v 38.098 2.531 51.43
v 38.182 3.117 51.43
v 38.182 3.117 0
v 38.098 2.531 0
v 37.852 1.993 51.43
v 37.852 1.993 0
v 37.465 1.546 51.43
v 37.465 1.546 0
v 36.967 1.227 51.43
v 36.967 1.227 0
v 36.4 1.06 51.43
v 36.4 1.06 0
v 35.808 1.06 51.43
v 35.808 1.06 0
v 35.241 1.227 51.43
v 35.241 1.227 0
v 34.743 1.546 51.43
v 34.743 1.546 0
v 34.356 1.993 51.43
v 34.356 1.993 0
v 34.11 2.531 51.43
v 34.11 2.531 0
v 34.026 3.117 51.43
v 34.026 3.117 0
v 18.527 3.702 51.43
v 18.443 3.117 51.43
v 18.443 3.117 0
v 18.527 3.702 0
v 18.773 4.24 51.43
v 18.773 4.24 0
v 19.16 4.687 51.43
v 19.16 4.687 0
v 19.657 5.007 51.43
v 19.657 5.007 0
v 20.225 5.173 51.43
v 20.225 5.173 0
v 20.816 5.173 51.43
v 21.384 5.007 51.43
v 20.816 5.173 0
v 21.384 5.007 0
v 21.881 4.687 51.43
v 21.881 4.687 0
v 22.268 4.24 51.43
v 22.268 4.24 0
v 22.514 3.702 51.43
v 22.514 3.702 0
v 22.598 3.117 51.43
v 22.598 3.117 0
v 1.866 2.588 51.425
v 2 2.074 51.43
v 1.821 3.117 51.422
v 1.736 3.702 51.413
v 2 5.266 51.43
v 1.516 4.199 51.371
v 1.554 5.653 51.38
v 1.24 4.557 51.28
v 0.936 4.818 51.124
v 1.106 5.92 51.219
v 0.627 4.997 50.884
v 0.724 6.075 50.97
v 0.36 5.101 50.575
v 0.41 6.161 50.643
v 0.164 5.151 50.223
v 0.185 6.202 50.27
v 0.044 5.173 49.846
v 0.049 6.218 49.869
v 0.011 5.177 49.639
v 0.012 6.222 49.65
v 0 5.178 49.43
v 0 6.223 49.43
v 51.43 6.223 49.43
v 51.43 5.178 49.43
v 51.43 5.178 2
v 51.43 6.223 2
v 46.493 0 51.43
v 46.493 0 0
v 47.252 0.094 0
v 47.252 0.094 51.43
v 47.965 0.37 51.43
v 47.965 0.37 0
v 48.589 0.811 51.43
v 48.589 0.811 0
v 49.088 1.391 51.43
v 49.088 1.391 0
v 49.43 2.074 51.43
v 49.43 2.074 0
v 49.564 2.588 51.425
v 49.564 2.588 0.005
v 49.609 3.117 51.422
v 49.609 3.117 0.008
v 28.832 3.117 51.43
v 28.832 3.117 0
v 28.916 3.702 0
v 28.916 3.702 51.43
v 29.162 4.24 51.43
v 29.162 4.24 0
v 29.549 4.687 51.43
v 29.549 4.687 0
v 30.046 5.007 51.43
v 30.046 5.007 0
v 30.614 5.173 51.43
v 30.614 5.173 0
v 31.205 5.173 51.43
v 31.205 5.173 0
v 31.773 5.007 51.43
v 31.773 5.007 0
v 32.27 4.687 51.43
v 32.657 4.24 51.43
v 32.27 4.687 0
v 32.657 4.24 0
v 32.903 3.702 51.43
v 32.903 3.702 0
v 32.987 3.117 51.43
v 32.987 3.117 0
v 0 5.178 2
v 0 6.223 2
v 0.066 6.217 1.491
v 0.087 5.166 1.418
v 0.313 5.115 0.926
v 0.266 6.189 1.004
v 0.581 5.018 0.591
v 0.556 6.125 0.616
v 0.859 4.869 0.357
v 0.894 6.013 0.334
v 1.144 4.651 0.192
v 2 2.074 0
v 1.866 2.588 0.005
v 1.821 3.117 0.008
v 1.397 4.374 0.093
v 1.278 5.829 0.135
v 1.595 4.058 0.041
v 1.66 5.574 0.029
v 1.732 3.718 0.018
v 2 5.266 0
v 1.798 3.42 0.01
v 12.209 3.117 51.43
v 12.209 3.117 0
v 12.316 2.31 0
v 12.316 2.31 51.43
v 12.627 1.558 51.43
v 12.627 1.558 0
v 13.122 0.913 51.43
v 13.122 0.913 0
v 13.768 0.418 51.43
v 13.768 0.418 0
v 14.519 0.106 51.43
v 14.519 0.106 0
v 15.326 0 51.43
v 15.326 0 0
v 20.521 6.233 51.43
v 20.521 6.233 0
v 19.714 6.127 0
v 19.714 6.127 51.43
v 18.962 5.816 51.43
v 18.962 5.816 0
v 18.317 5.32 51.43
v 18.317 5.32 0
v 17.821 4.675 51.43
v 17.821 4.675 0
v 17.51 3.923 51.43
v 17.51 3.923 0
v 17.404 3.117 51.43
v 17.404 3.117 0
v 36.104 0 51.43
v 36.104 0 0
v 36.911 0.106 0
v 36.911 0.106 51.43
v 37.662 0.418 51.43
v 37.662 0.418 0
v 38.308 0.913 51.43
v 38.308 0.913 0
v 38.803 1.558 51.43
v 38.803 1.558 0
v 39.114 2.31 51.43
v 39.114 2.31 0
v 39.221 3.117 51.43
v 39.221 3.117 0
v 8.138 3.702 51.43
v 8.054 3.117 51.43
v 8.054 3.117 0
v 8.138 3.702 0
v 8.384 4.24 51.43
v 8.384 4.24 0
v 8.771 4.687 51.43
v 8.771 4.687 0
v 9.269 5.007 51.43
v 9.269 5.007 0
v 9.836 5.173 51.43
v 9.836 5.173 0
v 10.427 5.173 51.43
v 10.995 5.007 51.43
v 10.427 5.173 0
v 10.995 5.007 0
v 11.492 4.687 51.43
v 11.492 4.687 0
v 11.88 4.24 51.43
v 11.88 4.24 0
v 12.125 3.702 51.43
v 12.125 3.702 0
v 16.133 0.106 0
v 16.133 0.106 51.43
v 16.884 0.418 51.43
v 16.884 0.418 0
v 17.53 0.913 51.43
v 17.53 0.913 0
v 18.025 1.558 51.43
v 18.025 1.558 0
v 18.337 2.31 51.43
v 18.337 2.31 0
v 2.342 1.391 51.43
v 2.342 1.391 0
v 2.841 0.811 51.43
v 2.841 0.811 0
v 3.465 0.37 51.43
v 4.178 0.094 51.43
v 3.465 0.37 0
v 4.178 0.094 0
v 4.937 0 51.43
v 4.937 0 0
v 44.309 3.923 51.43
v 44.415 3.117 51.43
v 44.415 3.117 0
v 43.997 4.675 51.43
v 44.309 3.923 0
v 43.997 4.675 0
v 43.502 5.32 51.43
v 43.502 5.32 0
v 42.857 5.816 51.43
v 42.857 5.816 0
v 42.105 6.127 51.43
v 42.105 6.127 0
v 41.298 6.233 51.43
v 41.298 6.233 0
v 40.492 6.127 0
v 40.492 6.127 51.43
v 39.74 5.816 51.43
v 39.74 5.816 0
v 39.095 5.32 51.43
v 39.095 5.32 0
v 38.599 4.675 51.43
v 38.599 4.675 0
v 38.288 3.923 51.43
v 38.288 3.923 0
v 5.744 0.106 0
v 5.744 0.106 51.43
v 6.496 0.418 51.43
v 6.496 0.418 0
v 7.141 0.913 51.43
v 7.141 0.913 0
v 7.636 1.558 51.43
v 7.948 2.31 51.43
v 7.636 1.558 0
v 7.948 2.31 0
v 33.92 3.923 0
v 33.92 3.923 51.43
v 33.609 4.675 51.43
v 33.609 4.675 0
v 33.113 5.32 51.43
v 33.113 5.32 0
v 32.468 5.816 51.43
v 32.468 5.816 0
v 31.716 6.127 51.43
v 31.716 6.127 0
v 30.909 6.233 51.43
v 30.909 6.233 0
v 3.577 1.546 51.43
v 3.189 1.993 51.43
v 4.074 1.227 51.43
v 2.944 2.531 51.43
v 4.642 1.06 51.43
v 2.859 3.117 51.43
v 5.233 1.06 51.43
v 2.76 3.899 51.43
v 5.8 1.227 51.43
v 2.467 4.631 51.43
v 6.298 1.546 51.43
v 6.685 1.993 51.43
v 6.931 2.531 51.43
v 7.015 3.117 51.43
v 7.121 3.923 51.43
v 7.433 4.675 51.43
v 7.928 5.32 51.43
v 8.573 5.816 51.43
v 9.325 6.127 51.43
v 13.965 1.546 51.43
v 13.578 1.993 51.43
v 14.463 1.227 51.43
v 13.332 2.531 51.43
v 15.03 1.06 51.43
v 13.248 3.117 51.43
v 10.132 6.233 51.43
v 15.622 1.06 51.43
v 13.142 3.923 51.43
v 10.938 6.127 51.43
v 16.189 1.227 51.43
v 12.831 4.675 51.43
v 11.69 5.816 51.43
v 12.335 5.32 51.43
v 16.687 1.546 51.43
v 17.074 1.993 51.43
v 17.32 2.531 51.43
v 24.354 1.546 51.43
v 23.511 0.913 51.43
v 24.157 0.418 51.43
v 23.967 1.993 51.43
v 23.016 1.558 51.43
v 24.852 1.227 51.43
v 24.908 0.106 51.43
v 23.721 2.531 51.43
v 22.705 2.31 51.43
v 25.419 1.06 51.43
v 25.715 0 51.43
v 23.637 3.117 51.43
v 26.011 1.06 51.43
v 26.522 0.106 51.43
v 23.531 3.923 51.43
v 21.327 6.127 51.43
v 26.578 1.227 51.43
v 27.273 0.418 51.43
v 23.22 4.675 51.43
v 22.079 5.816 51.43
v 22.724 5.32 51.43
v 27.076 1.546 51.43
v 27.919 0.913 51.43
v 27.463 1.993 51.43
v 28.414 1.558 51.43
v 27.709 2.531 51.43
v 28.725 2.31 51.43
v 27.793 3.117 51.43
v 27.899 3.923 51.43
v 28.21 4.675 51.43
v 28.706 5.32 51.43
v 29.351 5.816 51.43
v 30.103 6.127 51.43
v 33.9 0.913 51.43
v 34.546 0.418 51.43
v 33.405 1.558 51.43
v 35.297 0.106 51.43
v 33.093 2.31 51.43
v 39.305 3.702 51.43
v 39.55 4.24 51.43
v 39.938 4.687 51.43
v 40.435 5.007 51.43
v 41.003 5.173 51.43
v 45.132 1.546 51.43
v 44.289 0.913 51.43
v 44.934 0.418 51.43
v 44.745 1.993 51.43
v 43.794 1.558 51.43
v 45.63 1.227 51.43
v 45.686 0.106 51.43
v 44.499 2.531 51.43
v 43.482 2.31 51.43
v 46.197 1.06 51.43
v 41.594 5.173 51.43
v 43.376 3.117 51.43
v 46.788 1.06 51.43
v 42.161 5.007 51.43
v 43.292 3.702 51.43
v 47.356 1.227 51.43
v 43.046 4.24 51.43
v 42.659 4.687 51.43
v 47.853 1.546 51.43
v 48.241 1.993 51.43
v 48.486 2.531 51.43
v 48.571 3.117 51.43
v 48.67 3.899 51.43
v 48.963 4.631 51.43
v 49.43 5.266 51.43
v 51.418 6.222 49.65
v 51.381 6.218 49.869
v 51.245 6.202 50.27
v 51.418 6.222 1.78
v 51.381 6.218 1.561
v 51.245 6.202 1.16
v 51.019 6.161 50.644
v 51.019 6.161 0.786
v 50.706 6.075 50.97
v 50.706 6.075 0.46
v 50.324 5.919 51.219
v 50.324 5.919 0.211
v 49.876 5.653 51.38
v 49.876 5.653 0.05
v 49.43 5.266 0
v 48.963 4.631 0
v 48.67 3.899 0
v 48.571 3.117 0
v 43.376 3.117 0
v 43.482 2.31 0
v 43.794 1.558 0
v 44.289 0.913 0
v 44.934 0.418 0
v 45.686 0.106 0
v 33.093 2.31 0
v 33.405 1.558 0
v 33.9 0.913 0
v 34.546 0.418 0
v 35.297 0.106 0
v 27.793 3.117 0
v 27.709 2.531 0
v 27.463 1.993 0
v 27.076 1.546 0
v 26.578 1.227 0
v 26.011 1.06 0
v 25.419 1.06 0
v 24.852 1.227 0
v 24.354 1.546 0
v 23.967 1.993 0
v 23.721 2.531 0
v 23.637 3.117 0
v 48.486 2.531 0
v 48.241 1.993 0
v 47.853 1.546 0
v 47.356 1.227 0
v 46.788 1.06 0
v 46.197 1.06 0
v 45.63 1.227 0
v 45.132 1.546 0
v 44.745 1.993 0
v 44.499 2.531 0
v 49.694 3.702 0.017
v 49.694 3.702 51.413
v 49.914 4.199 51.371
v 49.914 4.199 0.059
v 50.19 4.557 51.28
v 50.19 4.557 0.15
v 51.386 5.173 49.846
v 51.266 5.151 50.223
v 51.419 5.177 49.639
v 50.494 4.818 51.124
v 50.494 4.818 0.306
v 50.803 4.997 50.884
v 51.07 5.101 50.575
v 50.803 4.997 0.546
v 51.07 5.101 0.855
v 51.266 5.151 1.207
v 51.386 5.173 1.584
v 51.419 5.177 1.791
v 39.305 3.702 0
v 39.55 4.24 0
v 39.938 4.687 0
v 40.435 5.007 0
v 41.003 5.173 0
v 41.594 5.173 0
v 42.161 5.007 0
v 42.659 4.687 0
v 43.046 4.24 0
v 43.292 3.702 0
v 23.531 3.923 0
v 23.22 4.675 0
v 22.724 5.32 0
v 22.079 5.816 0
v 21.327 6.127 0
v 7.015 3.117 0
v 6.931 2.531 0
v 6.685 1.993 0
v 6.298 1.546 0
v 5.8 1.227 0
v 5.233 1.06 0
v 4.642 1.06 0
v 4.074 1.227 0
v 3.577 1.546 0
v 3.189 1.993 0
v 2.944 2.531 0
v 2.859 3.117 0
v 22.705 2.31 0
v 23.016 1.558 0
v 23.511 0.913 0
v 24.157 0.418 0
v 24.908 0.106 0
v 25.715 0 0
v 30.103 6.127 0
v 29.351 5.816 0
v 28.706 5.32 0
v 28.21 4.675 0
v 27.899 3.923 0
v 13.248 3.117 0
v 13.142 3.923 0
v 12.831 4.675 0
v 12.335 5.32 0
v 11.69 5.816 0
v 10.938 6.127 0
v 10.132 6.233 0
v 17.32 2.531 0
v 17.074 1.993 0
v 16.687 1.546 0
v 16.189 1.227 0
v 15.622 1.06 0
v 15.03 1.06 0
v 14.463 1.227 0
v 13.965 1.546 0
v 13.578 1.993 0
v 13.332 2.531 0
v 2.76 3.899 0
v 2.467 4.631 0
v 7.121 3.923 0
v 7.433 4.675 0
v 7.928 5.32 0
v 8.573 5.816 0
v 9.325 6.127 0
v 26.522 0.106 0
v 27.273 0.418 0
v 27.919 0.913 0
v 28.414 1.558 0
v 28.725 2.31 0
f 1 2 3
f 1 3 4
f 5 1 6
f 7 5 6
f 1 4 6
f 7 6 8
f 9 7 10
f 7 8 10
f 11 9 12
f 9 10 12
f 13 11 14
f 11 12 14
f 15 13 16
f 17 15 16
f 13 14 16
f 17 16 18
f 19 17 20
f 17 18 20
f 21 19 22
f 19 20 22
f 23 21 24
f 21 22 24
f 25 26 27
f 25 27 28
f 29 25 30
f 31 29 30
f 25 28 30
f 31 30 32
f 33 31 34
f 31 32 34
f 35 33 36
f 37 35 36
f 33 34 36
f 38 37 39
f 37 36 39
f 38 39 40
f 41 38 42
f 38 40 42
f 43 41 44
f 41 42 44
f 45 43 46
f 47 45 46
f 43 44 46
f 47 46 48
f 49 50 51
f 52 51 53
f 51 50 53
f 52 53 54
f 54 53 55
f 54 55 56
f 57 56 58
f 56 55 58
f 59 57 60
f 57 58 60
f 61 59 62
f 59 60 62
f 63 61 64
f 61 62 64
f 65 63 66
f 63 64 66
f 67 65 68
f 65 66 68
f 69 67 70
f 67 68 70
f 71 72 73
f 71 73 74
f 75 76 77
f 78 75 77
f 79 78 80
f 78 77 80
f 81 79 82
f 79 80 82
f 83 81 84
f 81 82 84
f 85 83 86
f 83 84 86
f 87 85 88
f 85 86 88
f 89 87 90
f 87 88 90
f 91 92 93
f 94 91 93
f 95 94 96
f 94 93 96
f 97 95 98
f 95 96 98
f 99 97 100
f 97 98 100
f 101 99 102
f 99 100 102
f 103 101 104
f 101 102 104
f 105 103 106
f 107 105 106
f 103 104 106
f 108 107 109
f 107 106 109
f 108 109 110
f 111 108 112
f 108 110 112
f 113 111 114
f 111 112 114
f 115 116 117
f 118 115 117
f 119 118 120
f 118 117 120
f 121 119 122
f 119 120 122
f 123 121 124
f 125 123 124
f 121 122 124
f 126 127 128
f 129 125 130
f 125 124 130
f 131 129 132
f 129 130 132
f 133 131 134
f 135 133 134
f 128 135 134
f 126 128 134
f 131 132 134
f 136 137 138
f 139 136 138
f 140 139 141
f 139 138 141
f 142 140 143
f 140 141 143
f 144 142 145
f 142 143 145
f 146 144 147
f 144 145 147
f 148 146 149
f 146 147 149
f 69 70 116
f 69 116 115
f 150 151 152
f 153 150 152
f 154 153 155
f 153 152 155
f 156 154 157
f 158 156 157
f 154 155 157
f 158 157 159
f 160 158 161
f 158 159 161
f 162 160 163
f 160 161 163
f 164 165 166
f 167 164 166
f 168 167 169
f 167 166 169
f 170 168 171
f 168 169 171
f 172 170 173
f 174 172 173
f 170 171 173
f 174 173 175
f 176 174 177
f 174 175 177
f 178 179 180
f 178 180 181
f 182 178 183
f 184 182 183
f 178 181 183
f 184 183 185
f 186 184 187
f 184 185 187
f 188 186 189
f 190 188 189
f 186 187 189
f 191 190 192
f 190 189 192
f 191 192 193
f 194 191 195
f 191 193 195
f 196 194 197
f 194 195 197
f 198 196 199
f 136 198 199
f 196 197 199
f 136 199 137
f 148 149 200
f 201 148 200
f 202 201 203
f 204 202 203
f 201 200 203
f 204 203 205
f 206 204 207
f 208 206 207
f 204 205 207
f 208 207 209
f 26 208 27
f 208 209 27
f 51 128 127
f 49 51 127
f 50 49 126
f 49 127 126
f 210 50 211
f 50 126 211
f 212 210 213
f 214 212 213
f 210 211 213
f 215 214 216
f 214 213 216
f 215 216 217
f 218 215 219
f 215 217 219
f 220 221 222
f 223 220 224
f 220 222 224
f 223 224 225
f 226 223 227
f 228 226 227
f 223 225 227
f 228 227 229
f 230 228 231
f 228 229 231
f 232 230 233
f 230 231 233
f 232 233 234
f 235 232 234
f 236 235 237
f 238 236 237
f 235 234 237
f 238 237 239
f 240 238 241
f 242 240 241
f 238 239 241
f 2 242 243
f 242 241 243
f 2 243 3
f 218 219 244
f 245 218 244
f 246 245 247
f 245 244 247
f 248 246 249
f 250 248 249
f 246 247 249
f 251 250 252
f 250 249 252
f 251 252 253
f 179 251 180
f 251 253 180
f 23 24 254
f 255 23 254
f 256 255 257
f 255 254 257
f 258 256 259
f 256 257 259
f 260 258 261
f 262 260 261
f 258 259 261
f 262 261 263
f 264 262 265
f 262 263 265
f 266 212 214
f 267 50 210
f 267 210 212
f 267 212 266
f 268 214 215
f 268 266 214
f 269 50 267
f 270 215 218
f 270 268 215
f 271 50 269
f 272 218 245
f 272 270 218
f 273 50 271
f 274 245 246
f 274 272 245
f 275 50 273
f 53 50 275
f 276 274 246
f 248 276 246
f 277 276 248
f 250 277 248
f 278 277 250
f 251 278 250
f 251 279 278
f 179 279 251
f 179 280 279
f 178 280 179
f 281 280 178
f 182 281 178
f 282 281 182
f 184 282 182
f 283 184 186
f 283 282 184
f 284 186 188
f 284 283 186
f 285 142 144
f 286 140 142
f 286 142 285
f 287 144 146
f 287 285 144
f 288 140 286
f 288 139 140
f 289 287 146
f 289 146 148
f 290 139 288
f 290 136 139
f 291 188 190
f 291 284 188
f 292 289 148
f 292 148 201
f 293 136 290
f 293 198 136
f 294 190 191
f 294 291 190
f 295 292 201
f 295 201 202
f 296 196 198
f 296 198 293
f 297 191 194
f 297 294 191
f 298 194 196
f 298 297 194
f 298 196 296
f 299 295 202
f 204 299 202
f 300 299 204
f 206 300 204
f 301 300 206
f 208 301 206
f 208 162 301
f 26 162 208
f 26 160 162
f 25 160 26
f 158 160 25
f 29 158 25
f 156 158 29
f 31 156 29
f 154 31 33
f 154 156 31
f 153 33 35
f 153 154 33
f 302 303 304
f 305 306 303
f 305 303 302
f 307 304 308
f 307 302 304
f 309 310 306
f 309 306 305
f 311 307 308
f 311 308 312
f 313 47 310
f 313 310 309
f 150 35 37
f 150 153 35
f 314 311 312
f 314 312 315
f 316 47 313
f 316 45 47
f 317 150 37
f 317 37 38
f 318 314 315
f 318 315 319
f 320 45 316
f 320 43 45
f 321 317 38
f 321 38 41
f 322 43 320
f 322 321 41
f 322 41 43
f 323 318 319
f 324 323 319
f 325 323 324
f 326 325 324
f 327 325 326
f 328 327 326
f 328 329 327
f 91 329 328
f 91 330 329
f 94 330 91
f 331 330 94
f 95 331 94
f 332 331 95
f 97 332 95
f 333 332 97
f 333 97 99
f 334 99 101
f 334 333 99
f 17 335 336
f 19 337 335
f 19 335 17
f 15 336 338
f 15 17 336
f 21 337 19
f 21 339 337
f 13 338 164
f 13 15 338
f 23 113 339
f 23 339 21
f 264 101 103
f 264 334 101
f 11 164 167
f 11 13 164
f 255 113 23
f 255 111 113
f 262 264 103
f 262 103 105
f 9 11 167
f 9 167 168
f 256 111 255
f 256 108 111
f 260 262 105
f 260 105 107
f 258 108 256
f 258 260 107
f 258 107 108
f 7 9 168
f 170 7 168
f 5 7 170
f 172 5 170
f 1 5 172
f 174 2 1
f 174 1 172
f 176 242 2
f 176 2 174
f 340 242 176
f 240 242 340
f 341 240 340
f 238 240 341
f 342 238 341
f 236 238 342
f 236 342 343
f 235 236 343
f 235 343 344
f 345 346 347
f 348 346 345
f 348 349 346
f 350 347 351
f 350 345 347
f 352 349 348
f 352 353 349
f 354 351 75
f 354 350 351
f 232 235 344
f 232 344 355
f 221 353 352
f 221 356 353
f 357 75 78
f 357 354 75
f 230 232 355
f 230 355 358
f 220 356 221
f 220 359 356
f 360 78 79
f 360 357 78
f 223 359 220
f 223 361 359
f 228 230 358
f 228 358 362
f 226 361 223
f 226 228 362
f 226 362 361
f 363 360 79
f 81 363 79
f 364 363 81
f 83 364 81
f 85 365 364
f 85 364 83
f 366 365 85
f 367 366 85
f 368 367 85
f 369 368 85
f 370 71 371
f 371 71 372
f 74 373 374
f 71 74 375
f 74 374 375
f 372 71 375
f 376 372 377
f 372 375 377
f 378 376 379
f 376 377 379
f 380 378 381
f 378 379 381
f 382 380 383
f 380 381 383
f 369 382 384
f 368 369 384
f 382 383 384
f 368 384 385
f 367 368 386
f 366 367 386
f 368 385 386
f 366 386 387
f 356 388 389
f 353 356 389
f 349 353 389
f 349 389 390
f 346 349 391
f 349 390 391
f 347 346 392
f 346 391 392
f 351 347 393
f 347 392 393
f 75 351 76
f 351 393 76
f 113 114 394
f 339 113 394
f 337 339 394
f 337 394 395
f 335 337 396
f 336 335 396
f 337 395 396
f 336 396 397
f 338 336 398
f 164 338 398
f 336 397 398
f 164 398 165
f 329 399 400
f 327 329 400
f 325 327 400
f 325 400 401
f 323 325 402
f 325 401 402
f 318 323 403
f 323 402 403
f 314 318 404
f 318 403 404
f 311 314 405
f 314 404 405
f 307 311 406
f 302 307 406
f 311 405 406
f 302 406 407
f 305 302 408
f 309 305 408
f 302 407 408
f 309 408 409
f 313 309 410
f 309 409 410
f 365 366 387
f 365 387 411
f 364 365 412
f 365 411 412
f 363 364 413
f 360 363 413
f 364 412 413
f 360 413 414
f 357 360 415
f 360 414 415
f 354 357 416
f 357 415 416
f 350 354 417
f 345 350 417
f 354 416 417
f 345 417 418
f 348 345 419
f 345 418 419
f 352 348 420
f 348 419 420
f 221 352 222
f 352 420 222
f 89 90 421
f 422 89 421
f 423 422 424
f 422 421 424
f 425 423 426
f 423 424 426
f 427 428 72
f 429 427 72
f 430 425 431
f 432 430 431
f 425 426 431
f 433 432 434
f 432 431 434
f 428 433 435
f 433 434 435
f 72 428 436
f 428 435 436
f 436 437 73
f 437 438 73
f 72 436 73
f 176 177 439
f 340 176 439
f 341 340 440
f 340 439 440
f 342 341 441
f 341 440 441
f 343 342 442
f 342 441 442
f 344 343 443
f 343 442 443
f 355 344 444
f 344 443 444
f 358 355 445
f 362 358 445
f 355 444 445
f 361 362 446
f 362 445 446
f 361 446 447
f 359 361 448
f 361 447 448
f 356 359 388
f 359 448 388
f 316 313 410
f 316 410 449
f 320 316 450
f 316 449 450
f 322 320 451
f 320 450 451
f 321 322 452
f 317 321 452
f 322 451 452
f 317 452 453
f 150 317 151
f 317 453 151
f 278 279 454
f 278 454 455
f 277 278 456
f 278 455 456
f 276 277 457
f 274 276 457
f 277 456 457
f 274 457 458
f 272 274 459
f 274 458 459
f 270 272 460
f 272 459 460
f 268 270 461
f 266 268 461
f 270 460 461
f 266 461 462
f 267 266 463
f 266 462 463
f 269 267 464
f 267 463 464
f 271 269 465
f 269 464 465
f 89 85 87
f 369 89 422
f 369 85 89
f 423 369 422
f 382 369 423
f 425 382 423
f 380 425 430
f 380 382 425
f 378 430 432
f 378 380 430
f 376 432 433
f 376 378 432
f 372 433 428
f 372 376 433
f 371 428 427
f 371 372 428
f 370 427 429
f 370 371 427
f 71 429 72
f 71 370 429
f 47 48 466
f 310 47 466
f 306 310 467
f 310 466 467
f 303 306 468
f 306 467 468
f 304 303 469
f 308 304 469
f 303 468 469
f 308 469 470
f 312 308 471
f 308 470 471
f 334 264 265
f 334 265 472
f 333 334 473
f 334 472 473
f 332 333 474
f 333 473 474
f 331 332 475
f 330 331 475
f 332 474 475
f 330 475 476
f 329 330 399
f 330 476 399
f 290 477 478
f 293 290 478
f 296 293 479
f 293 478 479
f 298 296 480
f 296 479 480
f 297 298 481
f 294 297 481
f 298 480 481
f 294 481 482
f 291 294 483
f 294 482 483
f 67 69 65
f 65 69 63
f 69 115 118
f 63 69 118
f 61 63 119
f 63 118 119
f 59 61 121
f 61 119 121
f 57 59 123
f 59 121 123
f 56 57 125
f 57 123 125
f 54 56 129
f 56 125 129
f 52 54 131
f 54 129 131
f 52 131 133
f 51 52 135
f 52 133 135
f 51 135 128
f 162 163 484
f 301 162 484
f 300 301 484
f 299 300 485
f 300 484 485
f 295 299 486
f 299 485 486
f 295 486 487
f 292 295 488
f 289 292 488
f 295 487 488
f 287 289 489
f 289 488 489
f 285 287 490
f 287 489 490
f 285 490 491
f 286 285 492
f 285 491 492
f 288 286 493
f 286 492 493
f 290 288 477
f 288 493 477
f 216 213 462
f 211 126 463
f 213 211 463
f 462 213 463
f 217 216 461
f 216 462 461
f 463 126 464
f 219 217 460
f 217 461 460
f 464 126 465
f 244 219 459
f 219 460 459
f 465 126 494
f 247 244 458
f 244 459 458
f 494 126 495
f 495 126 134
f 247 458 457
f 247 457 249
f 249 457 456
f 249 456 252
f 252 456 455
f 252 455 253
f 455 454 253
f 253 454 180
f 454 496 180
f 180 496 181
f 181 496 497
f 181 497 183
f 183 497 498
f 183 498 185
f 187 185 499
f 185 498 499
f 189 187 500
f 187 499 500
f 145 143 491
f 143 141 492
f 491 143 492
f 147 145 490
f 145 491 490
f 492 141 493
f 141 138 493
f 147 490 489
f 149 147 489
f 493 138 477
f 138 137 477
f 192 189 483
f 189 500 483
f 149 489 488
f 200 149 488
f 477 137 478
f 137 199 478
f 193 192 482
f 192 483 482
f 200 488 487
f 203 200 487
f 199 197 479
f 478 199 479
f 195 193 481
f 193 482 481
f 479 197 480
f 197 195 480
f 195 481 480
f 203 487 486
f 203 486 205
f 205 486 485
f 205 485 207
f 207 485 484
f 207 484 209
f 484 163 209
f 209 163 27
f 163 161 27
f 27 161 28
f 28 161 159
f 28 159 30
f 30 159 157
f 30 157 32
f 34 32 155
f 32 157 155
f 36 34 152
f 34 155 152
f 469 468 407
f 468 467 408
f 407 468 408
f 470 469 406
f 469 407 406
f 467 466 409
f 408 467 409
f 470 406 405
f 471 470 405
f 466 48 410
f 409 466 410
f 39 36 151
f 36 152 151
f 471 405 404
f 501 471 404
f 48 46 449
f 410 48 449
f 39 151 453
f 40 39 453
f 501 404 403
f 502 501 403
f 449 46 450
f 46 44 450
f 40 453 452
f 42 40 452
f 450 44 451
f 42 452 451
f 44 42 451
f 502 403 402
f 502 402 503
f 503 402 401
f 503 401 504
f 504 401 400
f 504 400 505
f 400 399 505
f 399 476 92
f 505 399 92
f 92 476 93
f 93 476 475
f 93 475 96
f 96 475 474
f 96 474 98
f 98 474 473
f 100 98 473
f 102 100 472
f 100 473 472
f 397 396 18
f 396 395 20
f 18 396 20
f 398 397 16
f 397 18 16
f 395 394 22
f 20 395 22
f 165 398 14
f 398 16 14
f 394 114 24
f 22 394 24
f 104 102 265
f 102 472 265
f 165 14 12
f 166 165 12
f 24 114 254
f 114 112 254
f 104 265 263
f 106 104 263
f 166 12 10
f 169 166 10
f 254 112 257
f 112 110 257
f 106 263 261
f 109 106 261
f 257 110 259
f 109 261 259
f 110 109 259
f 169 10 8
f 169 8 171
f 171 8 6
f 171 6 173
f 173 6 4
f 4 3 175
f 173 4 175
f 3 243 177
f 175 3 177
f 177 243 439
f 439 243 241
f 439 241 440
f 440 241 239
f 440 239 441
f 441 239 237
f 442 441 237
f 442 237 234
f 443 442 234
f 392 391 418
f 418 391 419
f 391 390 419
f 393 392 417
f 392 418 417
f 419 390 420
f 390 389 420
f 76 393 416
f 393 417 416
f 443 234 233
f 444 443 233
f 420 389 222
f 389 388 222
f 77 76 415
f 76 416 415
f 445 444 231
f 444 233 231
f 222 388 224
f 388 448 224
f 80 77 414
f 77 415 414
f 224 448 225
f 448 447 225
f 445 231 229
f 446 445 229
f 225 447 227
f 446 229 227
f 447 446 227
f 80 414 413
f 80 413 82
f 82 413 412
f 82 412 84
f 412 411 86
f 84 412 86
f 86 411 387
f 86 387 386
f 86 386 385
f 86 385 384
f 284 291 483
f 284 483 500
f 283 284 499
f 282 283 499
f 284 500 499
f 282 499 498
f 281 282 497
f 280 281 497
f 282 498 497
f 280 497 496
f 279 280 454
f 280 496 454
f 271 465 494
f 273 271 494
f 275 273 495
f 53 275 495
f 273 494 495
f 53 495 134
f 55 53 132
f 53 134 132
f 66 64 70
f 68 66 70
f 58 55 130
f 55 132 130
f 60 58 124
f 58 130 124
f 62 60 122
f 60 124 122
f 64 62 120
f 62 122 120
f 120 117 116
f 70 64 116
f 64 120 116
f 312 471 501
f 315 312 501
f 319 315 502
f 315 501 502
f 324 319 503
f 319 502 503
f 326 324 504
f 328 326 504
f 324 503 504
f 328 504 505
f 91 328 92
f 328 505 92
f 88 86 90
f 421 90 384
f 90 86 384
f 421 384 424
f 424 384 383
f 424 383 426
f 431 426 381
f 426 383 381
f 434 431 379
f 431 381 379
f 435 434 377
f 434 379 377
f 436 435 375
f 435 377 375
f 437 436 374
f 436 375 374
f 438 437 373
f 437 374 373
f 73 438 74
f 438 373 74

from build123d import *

# Parameters (mm, degrees)
BOSS_EXTRUDE3_DEPTH = 51.43
CUT_EXTRUDE1_DEPTH  = 10


with BuildPart() as part:
    # Sketch2 → Boss-Extrude3 (new body)
    with BuildSketch(Plane.XY):
        with BuildLine():
            ThreePointArc((44.414999988, 3.116666665), (43.502149457, 5.320482799), (41.298333323, 6.23333333))
            ThreePointArc((41.298333323, 6.23333333), (39.09451719, 5.320482799), (38.181666658, 3.116666665))
            ThreePointArc((38.181666658, 3.116666665), (36.103888882, 1.038888889), (34.026111106, 3.116666665))
            ThreePointArc((34.026111106, 3.116666665), (33.113260575, 5.320482799), (30.909444441, 6.23333333))
            ThreePointArc((30.909444441, 6.23333333), (28.705628308, 5.320482799), (27.792777776, 3.116666665))
            ThreePointArc((27.792777776, 3.116666665), (25.715, 1.038888889), (23.637222224, 3.116666665))
            ThreePointArc((23.637222224, 3.116666665), (22.724371692, 5.320482799), (20.520555559, 6.23333333))
            ThreePointArc((20.520555559, 6.23333333), (18.316739425, 5.320482799), (17.403888894, 3.116666665))
            ThreePointArc((17.403888894, 3.116666665), (15.326111118, 1.038888889), (13.248333342, 3.116666665))
            ThreePointArc((13.248333342, 3.116666665), (12.33548281, 5.320482799), (10.131666677, 6.23333333))
            ThreePointArc((10.131666677, 6.23333333), (7.927850543, 5.320482799), (7.015000012, 3.116666665))
            ThreePointArc((7.015000012, 3.116666665), (4.937222236, 1.038888889), (2.859444459, 3.116666665))
            ThreePointArc((2.859444459, 3.116666665), (2.035732981, 5.227582962), (0, 6.222700766))
            Line((0, 6.222700766), (0, 5.178461326))
            ThreePointArc((0, 5.178461326), (1.300277565, 4.491932077), (1.820555571, 3.116666665))
            ThreePointArc((1.820555571, 3.116666665), (2.733406114, 0.91285052), (4.937222268, 0))
            ThreePointArc((4.937222268, 0), (7.141038381, 0.912850543), (8.053888901, 3.116666665))
            ThreePointArc((8.053888901, 3.116666665), (10.131666677, 5.194444441), (12.209444453, 3.116666665))
            ThreePointArc((12.209444453, 3.116666665), (13.122294999, 0.912850517), (15.326111158, 0))
            ThreePointArc((15.326111158, 0), (17.529927266, 0.912850546), (18.442777783, 3.116666665))
            ThreePointArc((18.442777783, 3.116666665), (20.520555559, 5.194444441), (22.598333335, 3.116666665))
            ThreePointArc((22.598333335, 3.116666665), (23.511183872, 0.912850526), (25.715000016, 0))
            ThreePointArc((25.715000016, 0), (27.918816139, 0.912850537), (28.831666665, 3.116666665))
            ThreePointArc((28.831666665, 3.116666665), (30.909444441, 5.194444441), (32.987222217, 3.116666665))
            ThreePointArc((32.987222217, 3.116666665), (33.900072749, 0.912850531), (36.103888882, 0))
            ThreePointArc((36.103888882, 0), (38.307705016, 0.912850531), (39.220555547, 3.116666665))
            ThreePointArc((39.220555547, 3.116666665), (41.298333323, 5.194444441), (43.376111099, 3.116666665))
            ThreePointArc((43.376111099, 3.116666665), (44.288961637, 0.912850526), (46.492777781, 0))
            ThreePointArc((46.492777781, 0), (48.696593904, 0.912850537), (49.609444429, 3.116666665))
            ThreePointArc((49.609444429, 3.116666665), (50.129722435, 4.491932077), (51.43, 5.178461326))
            Line((51.43, 5.178461326), (51.43, 6.222700766))
            ThreePointArc((51.43, 6.222700766), (49.394267019, 5.227582962), (48.570555541, 3.116666665))
            ThreePointArc((48.570555541, 3.116666665), (46.492777764, 1.038888889), (44.414999988, 3.116666665))
        make_face()
    extrude(amount=BOSS_EXTRUDE3_DEPTH)

    # Sketch3 → Cut-Extrude1 (cut)
    with BuildSketch(Plane(origin=(0, 6.23333333, 0), x_dir=(1, 0, 0), z_dir=(0, 1, 0))):
        with BuildLine():
            Line((51.43, -49.43), (51.43, -51.43))
            Line((51.43, -51.43), (49.43, -51.43))
            ThreePointArc((49.43, -51.43), (50.844213562, -50.844213562), (51.43, -49.43))
        make_face()
        with BuildLine():
            Line((51.43, 0), (49.43, 0))
            ThreePointArc((49.43, 0), (50.844213562, -0.585786438), (51.43, -2))
            Line((51.43, -2), (51.43, 0))
        make_face()
        with BuildLine():
            Line((0, 0), (0, -2))
            ThreePointArc((0, -2), (0.585786438, -0.585786438), (2, 0))
            Line((2, 0), (0, 0))
        make_face()
        with BuildLine():
            Line((0, -49.43), (0, -51.43))
            Line((0, -51.43), (2, -51.43))
            ThreePointArc((2, -51.43), (0.585786438, -50.844213562), (0, -49.43))
        make_face()
    extrude(amount=-CUT_EXTRUDE1_DEPTH, mode=Mode.SUBTRACT)


solid = part.part
